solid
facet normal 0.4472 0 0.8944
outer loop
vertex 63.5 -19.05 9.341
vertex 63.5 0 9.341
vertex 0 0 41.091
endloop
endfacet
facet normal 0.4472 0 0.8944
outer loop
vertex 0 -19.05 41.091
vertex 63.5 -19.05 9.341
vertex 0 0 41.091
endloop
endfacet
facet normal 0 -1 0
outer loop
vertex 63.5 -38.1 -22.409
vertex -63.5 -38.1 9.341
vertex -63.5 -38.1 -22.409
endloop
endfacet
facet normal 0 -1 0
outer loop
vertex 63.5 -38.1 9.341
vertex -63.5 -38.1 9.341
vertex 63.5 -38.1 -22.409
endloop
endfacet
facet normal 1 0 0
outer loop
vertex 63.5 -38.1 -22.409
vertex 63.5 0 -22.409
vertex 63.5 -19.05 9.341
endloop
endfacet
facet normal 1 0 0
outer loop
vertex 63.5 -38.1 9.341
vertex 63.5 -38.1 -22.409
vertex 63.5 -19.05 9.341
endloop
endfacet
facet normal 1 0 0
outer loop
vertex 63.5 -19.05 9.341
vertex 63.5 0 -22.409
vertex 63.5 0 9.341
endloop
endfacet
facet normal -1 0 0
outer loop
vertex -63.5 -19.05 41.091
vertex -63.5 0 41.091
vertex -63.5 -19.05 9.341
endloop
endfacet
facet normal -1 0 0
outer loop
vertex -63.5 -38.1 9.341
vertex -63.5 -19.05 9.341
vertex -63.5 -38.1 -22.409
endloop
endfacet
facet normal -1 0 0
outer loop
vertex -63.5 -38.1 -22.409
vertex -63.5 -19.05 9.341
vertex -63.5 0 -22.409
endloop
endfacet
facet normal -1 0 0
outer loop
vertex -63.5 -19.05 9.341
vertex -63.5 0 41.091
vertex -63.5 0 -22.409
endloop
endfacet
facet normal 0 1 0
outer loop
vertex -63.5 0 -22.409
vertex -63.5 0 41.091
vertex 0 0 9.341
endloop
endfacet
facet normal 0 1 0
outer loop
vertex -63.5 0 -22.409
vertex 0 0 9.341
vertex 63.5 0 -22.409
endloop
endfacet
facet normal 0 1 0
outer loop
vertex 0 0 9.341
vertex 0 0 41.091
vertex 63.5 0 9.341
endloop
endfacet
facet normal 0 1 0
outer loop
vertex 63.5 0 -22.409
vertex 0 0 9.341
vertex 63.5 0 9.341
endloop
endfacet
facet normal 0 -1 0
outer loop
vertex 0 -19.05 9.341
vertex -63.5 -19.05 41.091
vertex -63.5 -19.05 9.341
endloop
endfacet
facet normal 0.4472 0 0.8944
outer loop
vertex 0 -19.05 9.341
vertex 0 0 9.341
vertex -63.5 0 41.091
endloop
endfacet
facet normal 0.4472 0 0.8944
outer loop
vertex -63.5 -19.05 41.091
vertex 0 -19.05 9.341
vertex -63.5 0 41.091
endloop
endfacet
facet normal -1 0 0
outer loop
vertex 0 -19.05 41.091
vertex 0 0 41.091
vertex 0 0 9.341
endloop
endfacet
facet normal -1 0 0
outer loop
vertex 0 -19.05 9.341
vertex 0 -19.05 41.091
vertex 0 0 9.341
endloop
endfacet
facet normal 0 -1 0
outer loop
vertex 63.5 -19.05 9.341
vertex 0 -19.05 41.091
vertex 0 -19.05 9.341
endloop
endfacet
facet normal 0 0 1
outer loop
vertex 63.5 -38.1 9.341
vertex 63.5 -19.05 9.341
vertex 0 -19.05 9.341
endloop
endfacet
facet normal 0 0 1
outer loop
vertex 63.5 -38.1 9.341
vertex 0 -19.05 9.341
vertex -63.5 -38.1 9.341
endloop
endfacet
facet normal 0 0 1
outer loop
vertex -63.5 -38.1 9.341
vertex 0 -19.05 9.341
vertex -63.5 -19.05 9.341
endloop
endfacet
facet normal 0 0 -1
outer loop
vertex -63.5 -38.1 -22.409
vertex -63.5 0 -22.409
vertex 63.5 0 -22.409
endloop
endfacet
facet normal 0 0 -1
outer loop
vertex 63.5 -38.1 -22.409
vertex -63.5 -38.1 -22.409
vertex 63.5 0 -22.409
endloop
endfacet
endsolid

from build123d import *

# Parameters (mm, degrees)
F1_DEPTH = 38.1
F2_DEPTH = 19.05


# Not quite as in the source:
# - a length typed as a fraction of an inch, garbled in the dataset ("3 / 203.2 mm" for 3/8 in), is restored


with BuildPart() as f1:
    # F0 (on Front) → F1 (new body)
    with BuildSketch(Plane.XZ):
        Polygon((-63.5, 9.3406075202), (-63.5, -22.4093924798), (63.5, -22.4093924798), (63.5, 9.3406075202), (0, 9.3406075202), align=None)
    extrude(amount=F1_DEPTH)

    # F0 (on Front) → F2 (join)
    with BuildSketch(Plane.XZ):
        Polygon((-63.5, 41.0906075202), (-63.5, 9.3406075202), (0, 9.3406075202), align=None)
        Polygon((0, 9.3406075202), (63.5, 9.3406075202), (0, 41.0906075202), align=None)
    extrude(amount=F2_DEPTH)


solid = f1.part
